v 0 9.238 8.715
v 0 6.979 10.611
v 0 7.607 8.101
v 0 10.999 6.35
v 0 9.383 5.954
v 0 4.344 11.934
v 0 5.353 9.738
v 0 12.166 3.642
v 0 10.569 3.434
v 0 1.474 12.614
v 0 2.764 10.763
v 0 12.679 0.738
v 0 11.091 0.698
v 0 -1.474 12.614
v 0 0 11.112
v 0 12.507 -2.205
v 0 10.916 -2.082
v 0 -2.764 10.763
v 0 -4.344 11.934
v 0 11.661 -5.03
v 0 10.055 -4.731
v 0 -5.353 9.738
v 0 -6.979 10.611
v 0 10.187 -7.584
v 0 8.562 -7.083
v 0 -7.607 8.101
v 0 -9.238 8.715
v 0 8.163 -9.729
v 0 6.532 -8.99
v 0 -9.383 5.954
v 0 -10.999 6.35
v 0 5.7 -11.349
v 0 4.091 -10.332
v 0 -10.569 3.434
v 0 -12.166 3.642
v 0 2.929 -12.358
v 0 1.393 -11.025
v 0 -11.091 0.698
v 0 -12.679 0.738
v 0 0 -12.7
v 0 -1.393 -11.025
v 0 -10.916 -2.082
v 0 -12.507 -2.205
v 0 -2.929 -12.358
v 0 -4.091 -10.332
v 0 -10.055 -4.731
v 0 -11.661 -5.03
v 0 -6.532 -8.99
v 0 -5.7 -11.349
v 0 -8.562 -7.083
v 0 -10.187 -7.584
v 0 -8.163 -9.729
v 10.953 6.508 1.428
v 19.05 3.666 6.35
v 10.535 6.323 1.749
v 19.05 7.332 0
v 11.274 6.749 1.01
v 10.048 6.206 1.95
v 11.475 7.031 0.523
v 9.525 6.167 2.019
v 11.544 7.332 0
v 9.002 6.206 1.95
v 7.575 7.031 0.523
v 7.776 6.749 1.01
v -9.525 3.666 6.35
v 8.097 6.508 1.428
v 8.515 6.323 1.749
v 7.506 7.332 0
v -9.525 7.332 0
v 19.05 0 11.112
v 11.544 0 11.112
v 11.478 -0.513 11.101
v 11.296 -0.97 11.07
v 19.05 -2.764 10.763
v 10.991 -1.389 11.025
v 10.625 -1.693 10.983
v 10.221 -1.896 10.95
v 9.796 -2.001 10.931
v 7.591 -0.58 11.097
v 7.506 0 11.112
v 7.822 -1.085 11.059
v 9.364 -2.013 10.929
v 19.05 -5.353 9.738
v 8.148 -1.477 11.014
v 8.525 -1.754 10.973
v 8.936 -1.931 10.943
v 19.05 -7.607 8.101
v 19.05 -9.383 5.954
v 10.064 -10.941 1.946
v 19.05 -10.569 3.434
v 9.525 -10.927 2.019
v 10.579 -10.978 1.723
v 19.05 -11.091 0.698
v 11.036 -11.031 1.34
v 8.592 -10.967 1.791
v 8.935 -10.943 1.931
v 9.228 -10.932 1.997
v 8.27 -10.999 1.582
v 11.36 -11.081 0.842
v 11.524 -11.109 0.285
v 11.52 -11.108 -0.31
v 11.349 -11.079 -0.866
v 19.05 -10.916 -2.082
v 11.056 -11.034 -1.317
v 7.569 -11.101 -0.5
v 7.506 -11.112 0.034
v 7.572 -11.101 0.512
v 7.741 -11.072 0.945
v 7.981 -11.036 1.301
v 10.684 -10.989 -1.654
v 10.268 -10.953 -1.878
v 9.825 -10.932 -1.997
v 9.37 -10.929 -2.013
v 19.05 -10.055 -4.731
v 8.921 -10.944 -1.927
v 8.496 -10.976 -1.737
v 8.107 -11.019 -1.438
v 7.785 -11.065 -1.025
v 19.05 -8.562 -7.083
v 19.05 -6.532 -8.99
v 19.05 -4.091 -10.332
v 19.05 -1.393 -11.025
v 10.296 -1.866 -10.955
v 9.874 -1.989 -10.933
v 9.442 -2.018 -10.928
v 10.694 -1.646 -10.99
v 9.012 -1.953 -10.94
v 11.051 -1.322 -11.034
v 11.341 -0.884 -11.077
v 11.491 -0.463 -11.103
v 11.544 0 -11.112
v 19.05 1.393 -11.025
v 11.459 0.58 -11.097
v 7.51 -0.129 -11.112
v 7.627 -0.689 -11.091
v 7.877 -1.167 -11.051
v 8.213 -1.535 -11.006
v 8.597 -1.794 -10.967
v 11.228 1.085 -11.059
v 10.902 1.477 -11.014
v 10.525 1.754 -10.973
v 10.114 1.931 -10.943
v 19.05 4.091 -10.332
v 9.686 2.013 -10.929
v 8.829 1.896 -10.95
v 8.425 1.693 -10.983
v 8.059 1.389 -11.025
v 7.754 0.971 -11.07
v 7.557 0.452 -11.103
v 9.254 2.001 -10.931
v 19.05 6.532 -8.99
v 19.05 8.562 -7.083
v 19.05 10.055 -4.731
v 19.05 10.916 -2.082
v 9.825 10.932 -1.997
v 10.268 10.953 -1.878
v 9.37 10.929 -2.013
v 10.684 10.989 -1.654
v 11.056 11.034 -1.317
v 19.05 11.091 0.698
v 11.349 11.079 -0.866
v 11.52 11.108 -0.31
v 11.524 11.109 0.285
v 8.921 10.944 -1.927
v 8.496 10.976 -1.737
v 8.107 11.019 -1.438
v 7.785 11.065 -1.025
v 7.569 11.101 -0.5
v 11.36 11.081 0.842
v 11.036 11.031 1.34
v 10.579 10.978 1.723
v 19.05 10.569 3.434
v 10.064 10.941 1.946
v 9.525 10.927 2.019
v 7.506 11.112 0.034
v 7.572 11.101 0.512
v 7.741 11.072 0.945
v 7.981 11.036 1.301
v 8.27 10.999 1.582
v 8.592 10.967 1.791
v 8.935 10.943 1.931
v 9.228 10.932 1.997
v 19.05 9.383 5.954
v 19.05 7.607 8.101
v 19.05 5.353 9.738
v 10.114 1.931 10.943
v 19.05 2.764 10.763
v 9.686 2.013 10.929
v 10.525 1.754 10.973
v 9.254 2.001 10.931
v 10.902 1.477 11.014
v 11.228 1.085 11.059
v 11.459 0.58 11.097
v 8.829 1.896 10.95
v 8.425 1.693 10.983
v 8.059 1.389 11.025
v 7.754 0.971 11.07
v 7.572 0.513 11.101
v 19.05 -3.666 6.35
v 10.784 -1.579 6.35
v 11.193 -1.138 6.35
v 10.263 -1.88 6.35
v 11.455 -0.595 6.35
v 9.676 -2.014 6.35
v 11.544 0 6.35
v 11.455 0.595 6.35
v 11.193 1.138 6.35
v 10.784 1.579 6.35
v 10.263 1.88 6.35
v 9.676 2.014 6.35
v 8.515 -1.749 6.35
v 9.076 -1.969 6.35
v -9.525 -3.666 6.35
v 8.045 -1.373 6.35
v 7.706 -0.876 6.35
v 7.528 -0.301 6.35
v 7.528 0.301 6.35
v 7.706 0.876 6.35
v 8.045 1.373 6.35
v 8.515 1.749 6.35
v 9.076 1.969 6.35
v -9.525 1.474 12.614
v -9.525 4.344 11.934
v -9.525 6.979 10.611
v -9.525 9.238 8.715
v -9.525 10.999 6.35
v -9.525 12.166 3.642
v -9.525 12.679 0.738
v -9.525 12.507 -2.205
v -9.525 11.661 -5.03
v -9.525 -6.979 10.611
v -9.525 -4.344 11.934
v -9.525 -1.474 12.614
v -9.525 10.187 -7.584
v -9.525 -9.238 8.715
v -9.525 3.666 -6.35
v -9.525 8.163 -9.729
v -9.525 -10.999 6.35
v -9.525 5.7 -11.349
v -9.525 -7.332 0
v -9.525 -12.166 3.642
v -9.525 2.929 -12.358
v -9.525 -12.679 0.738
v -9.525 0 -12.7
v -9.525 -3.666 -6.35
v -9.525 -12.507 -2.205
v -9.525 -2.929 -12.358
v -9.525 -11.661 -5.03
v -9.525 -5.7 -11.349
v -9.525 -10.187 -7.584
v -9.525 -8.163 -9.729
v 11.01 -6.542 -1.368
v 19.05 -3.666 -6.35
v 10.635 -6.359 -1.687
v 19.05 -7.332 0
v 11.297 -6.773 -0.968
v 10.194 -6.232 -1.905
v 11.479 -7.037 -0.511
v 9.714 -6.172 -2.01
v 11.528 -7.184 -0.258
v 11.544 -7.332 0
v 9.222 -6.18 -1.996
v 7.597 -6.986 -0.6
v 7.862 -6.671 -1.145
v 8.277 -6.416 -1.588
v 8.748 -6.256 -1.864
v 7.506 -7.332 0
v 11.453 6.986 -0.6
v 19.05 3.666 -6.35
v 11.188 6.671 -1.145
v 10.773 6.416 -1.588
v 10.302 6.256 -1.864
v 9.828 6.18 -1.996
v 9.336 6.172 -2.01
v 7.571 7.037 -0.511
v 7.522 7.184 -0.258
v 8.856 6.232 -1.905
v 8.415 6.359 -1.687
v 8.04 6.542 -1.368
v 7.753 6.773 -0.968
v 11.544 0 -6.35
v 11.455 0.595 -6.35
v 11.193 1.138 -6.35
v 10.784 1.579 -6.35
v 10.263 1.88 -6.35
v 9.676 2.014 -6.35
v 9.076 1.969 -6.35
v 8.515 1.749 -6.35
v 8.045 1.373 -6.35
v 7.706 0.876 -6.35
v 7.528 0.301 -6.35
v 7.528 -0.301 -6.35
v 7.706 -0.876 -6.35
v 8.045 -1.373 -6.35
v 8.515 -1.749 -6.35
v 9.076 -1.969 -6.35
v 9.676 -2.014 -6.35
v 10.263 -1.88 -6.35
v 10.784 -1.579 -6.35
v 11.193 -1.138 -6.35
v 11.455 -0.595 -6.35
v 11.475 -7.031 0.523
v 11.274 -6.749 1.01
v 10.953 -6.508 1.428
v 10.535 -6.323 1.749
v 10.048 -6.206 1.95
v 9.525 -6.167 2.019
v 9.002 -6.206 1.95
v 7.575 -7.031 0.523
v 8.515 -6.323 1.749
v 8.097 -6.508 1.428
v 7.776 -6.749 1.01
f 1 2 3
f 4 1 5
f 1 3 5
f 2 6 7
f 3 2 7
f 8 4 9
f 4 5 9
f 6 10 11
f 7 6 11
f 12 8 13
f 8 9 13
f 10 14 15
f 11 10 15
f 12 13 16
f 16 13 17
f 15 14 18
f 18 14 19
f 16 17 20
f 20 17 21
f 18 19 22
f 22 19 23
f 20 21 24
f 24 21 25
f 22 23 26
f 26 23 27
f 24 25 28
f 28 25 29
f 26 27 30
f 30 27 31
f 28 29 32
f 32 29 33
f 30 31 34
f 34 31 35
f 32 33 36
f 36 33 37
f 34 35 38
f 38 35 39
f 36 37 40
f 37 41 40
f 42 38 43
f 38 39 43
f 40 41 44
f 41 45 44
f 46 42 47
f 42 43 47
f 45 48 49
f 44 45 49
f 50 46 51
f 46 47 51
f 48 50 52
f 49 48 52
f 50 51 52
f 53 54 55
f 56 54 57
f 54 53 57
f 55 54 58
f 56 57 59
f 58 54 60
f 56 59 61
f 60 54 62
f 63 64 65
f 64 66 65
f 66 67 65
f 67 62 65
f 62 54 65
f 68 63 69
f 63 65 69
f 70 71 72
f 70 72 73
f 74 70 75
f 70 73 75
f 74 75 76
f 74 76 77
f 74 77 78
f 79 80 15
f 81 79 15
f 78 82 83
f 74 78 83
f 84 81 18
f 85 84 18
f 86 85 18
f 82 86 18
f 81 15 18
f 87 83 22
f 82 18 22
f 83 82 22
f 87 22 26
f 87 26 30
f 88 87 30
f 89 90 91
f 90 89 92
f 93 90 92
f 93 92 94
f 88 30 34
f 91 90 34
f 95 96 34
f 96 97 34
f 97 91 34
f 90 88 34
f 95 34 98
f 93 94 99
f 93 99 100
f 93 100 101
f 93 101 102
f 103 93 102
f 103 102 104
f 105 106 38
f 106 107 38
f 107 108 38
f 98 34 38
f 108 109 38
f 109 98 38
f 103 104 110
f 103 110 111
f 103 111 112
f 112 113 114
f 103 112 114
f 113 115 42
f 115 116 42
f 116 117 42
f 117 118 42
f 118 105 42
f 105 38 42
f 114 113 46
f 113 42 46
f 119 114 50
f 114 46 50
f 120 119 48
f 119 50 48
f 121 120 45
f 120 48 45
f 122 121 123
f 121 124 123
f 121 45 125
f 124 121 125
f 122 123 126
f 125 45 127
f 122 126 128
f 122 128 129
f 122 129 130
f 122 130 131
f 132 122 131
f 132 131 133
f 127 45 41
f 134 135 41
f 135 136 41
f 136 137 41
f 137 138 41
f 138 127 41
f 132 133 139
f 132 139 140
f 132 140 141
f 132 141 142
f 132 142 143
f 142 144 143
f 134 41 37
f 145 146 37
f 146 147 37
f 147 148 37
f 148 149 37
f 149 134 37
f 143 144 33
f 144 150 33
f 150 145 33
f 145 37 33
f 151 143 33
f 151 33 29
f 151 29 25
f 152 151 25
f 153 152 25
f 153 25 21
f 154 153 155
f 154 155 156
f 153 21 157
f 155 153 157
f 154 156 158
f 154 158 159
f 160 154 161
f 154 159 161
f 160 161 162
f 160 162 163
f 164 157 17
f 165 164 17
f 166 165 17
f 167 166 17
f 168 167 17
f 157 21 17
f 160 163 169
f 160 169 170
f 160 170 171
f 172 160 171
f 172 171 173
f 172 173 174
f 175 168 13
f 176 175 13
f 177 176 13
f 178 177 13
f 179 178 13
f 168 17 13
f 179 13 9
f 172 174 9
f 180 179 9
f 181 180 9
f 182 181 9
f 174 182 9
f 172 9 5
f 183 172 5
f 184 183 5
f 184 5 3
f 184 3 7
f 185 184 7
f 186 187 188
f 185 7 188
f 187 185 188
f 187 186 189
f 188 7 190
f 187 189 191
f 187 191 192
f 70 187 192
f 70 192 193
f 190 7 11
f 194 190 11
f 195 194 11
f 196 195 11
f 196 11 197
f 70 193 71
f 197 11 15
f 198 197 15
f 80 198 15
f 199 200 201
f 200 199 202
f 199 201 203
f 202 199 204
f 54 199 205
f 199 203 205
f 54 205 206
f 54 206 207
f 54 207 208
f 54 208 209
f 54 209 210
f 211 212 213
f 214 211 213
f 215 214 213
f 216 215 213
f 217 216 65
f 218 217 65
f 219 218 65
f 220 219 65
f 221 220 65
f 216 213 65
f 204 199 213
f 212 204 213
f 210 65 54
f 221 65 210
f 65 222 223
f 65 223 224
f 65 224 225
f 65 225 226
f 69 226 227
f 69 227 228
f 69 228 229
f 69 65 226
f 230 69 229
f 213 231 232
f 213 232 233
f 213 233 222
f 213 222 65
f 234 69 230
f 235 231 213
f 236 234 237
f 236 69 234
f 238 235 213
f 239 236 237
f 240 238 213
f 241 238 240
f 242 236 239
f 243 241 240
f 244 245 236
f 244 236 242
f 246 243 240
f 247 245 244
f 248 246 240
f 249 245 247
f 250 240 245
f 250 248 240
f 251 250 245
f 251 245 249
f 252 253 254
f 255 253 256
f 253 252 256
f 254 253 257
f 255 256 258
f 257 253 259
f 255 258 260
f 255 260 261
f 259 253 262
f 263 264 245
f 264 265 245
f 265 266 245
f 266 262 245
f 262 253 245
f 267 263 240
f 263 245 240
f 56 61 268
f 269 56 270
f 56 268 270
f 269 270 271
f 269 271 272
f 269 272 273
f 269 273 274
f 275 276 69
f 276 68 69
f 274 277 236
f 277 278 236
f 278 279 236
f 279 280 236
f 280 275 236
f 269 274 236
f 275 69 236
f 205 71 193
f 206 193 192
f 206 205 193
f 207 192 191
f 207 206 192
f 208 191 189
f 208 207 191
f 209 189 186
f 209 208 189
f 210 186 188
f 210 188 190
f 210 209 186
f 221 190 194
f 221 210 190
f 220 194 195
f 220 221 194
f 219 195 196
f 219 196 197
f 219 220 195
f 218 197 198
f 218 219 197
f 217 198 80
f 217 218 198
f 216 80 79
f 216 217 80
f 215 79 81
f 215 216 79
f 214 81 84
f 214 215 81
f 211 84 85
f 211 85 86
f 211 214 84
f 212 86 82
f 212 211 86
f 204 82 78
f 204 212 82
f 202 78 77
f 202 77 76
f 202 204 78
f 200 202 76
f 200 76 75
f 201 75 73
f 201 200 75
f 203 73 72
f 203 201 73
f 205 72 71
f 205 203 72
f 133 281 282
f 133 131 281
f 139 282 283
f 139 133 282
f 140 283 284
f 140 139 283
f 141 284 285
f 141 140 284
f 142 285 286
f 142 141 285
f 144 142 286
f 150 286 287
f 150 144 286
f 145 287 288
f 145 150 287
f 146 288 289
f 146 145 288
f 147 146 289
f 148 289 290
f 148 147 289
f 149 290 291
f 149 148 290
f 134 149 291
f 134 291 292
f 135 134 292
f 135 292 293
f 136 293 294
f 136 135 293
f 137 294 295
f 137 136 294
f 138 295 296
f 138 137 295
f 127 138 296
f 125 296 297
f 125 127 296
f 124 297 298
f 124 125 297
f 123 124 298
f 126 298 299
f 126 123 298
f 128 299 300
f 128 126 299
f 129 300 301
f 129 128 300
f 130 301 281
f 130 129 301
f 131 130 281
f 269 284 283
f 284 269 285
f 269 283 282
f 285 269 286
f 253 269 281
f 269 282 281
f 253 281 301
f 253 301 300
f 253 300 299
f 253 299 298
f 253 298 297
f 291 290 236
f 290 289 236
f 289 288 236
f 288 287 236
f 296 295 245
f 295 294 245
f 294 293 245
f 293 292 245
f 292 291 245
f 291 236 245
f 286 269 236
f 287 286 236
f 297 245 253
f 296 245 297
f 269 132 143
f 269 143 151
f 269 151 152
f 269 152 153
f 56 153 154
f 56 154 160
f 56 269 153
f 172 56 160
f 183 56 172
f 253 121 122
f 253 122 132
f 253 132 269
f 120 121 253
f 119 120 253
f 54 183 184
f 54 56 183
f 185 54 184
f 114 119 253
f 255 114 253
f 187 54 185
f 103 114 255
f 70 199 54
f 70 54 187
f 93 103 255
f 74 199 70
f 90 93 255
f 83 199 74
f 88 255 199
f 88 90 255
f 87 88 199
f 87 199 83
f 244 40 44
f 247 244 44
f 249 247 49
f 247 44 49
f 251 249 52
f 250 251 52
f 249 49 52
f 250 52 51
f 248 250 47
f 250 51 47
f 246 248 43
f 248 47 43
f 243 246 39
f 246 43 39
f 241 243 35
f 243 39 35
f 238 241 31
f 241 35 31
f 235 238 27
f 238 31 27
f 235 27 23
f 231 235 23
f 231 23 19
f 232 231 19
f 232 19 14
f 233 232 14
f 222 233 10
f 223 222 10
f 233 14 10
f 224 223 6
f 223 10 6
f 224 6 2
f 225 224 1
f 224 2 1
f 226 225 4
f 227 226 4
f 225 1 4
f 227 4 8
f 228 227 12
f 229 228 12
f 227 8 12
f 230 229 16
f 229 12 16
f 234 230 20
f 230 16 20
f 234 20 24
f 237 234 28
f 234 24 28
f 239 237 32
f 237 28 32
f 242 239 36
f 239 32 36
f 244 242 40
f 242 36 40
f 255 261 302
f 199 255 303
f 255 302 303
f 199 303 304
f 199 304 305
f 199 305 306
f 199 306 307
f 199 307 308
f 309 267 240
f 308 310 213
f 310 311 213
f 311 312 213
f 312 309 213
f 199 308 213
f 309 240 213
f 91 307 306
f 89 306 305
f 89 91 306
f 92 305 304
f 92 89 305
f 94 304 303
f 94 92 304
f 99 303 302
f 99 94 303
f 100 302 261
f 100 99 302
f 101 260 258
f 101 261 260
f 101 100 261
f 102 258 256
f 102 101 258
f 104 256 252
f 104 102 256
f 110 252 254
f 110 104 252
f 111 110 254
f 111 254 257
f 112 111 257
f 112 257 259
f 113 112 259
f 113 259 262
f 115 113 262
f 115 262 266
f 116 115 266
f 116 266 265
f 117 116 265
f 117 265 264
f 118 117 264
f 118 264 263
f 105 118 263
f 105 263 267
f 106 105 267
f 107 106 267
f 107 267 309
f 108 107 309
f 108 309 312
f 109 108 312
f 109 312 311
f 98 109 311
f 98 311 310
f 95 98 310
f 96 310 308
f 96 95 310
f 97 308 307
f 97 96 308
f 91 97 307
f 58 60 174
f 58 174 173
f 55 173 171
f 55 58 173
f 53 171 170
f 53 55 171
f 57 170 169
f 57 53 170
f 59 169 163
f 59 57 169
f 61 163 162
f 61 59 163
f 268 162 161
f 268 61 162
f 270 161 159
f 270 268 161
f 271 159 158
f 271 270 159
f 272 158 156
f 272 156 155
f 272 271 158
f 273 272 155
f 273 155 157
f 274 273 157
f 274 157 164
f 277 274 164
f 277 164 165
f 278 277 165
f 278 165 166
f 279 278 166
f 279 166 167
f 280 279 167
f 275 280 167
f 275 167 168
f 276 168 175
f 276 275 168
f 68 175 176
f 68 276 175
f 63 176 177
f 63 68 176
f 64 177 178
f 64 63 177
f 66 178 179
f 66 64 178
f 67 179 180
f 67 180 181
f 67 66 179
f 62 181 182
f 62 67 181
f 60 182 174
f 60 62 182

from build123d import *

# Parameters (mm, degrees)
SKETCH1_R               = 11.1125
BOSS_EXTRUDE1_DEPTH     = 19.05
SKETCH2_R               = 12.7
BOSS_EXTRUDE2_DEPTH     = 9.525
CUT_EXTRUDE1_DEPTH      = 34.750712955
CUT_EXTRUDE2_DEPTH      = 27.181720723
CUT_EXTRUDE2_DEPTH_BACK = 27.181720723
SKETCH5_R               = 2.0193
CUT_EXTRUDE3_DEPTH      = 27.181720795
CUT_EXTRUDE3_DEPTH_BACK = 27.181720795
SKETCH6_R               = 2.0193


with BuildPart() as part:
    # Sketch1 → Boss-Extrude1 (new body)
    with BuildSketch(Plane(origin=(0, 0, 0), x_dir=(0, 0, -1), z_dir=(1, 0, 0))):
        with Locations(Location((0, 0, 0), (0, 0, 180))):
            Circle(SKETCH1_R)
    extrude(amount=BOSS_EXTRUDE1_DEPTH)

    # Sketch2 → Boss-Extrude2 (add)
    with BuildSketch(Plane.ZY):
        with Locations(Location((0, 0, 0), (0, 0, 180))):
            Circle(SKETCH2_R)
    extrude(amount=BOSS_EXTRUDE2_DEPTH)

    # Sketch4 → Cut-Extrude1 (cut, through all)
    with BuildSketch(Plane.ZY.offset(9.525)):
        Polygon((0, 7.332348419), (-6.35, 3.666174209), (-6.35, -3.666174209), (0, -7.332348419), (6.35, -3.666174209), (6.35, 3.666174209), align=None)
    extrude(amount=-CUT_EXTRUDE1_DEPTH, mode=Mode.SUBTRACT)

    # Sketch5 → Cut-Extrude2 (cut, two sides: drawn at the far end of the back side and taken through both)
    with BuildSketch(Plane.XY.offset(-CUT_EXTRUDE2_DEPTH_BACK)):
        with Locations((9.525, 0)):
            Circle(SKETCH5_R)
    extrude(amount=CUT_EXTRUDE2_DEPTH + CUT_EXTRUDE2_DEPTH_BACK, mode=Mode.SUBTRACT)

    # Sketch6 → Cut-Extrude3 (cut, two sides: drawn at the far end of the back side and taken through both)
    with BuildSketch(Plane(origin=(0, 0, 0), x_dir=(1, 0, 0), z_dir=(0, 1, 0)).offset(-CUT_EXTRUDE3_DEPTH_BACK)):
        with Locations(Location((9.525, 0, 0), (0, 0, 270))):
            Circle(SKETCH6_R)
    extrude(amount=CUT_EXTRUDE3_DEPTH + CUT_EXTRUDE3_DEPTH_BACK, mode=Mode.SUBTRACT)


solid = part.part
